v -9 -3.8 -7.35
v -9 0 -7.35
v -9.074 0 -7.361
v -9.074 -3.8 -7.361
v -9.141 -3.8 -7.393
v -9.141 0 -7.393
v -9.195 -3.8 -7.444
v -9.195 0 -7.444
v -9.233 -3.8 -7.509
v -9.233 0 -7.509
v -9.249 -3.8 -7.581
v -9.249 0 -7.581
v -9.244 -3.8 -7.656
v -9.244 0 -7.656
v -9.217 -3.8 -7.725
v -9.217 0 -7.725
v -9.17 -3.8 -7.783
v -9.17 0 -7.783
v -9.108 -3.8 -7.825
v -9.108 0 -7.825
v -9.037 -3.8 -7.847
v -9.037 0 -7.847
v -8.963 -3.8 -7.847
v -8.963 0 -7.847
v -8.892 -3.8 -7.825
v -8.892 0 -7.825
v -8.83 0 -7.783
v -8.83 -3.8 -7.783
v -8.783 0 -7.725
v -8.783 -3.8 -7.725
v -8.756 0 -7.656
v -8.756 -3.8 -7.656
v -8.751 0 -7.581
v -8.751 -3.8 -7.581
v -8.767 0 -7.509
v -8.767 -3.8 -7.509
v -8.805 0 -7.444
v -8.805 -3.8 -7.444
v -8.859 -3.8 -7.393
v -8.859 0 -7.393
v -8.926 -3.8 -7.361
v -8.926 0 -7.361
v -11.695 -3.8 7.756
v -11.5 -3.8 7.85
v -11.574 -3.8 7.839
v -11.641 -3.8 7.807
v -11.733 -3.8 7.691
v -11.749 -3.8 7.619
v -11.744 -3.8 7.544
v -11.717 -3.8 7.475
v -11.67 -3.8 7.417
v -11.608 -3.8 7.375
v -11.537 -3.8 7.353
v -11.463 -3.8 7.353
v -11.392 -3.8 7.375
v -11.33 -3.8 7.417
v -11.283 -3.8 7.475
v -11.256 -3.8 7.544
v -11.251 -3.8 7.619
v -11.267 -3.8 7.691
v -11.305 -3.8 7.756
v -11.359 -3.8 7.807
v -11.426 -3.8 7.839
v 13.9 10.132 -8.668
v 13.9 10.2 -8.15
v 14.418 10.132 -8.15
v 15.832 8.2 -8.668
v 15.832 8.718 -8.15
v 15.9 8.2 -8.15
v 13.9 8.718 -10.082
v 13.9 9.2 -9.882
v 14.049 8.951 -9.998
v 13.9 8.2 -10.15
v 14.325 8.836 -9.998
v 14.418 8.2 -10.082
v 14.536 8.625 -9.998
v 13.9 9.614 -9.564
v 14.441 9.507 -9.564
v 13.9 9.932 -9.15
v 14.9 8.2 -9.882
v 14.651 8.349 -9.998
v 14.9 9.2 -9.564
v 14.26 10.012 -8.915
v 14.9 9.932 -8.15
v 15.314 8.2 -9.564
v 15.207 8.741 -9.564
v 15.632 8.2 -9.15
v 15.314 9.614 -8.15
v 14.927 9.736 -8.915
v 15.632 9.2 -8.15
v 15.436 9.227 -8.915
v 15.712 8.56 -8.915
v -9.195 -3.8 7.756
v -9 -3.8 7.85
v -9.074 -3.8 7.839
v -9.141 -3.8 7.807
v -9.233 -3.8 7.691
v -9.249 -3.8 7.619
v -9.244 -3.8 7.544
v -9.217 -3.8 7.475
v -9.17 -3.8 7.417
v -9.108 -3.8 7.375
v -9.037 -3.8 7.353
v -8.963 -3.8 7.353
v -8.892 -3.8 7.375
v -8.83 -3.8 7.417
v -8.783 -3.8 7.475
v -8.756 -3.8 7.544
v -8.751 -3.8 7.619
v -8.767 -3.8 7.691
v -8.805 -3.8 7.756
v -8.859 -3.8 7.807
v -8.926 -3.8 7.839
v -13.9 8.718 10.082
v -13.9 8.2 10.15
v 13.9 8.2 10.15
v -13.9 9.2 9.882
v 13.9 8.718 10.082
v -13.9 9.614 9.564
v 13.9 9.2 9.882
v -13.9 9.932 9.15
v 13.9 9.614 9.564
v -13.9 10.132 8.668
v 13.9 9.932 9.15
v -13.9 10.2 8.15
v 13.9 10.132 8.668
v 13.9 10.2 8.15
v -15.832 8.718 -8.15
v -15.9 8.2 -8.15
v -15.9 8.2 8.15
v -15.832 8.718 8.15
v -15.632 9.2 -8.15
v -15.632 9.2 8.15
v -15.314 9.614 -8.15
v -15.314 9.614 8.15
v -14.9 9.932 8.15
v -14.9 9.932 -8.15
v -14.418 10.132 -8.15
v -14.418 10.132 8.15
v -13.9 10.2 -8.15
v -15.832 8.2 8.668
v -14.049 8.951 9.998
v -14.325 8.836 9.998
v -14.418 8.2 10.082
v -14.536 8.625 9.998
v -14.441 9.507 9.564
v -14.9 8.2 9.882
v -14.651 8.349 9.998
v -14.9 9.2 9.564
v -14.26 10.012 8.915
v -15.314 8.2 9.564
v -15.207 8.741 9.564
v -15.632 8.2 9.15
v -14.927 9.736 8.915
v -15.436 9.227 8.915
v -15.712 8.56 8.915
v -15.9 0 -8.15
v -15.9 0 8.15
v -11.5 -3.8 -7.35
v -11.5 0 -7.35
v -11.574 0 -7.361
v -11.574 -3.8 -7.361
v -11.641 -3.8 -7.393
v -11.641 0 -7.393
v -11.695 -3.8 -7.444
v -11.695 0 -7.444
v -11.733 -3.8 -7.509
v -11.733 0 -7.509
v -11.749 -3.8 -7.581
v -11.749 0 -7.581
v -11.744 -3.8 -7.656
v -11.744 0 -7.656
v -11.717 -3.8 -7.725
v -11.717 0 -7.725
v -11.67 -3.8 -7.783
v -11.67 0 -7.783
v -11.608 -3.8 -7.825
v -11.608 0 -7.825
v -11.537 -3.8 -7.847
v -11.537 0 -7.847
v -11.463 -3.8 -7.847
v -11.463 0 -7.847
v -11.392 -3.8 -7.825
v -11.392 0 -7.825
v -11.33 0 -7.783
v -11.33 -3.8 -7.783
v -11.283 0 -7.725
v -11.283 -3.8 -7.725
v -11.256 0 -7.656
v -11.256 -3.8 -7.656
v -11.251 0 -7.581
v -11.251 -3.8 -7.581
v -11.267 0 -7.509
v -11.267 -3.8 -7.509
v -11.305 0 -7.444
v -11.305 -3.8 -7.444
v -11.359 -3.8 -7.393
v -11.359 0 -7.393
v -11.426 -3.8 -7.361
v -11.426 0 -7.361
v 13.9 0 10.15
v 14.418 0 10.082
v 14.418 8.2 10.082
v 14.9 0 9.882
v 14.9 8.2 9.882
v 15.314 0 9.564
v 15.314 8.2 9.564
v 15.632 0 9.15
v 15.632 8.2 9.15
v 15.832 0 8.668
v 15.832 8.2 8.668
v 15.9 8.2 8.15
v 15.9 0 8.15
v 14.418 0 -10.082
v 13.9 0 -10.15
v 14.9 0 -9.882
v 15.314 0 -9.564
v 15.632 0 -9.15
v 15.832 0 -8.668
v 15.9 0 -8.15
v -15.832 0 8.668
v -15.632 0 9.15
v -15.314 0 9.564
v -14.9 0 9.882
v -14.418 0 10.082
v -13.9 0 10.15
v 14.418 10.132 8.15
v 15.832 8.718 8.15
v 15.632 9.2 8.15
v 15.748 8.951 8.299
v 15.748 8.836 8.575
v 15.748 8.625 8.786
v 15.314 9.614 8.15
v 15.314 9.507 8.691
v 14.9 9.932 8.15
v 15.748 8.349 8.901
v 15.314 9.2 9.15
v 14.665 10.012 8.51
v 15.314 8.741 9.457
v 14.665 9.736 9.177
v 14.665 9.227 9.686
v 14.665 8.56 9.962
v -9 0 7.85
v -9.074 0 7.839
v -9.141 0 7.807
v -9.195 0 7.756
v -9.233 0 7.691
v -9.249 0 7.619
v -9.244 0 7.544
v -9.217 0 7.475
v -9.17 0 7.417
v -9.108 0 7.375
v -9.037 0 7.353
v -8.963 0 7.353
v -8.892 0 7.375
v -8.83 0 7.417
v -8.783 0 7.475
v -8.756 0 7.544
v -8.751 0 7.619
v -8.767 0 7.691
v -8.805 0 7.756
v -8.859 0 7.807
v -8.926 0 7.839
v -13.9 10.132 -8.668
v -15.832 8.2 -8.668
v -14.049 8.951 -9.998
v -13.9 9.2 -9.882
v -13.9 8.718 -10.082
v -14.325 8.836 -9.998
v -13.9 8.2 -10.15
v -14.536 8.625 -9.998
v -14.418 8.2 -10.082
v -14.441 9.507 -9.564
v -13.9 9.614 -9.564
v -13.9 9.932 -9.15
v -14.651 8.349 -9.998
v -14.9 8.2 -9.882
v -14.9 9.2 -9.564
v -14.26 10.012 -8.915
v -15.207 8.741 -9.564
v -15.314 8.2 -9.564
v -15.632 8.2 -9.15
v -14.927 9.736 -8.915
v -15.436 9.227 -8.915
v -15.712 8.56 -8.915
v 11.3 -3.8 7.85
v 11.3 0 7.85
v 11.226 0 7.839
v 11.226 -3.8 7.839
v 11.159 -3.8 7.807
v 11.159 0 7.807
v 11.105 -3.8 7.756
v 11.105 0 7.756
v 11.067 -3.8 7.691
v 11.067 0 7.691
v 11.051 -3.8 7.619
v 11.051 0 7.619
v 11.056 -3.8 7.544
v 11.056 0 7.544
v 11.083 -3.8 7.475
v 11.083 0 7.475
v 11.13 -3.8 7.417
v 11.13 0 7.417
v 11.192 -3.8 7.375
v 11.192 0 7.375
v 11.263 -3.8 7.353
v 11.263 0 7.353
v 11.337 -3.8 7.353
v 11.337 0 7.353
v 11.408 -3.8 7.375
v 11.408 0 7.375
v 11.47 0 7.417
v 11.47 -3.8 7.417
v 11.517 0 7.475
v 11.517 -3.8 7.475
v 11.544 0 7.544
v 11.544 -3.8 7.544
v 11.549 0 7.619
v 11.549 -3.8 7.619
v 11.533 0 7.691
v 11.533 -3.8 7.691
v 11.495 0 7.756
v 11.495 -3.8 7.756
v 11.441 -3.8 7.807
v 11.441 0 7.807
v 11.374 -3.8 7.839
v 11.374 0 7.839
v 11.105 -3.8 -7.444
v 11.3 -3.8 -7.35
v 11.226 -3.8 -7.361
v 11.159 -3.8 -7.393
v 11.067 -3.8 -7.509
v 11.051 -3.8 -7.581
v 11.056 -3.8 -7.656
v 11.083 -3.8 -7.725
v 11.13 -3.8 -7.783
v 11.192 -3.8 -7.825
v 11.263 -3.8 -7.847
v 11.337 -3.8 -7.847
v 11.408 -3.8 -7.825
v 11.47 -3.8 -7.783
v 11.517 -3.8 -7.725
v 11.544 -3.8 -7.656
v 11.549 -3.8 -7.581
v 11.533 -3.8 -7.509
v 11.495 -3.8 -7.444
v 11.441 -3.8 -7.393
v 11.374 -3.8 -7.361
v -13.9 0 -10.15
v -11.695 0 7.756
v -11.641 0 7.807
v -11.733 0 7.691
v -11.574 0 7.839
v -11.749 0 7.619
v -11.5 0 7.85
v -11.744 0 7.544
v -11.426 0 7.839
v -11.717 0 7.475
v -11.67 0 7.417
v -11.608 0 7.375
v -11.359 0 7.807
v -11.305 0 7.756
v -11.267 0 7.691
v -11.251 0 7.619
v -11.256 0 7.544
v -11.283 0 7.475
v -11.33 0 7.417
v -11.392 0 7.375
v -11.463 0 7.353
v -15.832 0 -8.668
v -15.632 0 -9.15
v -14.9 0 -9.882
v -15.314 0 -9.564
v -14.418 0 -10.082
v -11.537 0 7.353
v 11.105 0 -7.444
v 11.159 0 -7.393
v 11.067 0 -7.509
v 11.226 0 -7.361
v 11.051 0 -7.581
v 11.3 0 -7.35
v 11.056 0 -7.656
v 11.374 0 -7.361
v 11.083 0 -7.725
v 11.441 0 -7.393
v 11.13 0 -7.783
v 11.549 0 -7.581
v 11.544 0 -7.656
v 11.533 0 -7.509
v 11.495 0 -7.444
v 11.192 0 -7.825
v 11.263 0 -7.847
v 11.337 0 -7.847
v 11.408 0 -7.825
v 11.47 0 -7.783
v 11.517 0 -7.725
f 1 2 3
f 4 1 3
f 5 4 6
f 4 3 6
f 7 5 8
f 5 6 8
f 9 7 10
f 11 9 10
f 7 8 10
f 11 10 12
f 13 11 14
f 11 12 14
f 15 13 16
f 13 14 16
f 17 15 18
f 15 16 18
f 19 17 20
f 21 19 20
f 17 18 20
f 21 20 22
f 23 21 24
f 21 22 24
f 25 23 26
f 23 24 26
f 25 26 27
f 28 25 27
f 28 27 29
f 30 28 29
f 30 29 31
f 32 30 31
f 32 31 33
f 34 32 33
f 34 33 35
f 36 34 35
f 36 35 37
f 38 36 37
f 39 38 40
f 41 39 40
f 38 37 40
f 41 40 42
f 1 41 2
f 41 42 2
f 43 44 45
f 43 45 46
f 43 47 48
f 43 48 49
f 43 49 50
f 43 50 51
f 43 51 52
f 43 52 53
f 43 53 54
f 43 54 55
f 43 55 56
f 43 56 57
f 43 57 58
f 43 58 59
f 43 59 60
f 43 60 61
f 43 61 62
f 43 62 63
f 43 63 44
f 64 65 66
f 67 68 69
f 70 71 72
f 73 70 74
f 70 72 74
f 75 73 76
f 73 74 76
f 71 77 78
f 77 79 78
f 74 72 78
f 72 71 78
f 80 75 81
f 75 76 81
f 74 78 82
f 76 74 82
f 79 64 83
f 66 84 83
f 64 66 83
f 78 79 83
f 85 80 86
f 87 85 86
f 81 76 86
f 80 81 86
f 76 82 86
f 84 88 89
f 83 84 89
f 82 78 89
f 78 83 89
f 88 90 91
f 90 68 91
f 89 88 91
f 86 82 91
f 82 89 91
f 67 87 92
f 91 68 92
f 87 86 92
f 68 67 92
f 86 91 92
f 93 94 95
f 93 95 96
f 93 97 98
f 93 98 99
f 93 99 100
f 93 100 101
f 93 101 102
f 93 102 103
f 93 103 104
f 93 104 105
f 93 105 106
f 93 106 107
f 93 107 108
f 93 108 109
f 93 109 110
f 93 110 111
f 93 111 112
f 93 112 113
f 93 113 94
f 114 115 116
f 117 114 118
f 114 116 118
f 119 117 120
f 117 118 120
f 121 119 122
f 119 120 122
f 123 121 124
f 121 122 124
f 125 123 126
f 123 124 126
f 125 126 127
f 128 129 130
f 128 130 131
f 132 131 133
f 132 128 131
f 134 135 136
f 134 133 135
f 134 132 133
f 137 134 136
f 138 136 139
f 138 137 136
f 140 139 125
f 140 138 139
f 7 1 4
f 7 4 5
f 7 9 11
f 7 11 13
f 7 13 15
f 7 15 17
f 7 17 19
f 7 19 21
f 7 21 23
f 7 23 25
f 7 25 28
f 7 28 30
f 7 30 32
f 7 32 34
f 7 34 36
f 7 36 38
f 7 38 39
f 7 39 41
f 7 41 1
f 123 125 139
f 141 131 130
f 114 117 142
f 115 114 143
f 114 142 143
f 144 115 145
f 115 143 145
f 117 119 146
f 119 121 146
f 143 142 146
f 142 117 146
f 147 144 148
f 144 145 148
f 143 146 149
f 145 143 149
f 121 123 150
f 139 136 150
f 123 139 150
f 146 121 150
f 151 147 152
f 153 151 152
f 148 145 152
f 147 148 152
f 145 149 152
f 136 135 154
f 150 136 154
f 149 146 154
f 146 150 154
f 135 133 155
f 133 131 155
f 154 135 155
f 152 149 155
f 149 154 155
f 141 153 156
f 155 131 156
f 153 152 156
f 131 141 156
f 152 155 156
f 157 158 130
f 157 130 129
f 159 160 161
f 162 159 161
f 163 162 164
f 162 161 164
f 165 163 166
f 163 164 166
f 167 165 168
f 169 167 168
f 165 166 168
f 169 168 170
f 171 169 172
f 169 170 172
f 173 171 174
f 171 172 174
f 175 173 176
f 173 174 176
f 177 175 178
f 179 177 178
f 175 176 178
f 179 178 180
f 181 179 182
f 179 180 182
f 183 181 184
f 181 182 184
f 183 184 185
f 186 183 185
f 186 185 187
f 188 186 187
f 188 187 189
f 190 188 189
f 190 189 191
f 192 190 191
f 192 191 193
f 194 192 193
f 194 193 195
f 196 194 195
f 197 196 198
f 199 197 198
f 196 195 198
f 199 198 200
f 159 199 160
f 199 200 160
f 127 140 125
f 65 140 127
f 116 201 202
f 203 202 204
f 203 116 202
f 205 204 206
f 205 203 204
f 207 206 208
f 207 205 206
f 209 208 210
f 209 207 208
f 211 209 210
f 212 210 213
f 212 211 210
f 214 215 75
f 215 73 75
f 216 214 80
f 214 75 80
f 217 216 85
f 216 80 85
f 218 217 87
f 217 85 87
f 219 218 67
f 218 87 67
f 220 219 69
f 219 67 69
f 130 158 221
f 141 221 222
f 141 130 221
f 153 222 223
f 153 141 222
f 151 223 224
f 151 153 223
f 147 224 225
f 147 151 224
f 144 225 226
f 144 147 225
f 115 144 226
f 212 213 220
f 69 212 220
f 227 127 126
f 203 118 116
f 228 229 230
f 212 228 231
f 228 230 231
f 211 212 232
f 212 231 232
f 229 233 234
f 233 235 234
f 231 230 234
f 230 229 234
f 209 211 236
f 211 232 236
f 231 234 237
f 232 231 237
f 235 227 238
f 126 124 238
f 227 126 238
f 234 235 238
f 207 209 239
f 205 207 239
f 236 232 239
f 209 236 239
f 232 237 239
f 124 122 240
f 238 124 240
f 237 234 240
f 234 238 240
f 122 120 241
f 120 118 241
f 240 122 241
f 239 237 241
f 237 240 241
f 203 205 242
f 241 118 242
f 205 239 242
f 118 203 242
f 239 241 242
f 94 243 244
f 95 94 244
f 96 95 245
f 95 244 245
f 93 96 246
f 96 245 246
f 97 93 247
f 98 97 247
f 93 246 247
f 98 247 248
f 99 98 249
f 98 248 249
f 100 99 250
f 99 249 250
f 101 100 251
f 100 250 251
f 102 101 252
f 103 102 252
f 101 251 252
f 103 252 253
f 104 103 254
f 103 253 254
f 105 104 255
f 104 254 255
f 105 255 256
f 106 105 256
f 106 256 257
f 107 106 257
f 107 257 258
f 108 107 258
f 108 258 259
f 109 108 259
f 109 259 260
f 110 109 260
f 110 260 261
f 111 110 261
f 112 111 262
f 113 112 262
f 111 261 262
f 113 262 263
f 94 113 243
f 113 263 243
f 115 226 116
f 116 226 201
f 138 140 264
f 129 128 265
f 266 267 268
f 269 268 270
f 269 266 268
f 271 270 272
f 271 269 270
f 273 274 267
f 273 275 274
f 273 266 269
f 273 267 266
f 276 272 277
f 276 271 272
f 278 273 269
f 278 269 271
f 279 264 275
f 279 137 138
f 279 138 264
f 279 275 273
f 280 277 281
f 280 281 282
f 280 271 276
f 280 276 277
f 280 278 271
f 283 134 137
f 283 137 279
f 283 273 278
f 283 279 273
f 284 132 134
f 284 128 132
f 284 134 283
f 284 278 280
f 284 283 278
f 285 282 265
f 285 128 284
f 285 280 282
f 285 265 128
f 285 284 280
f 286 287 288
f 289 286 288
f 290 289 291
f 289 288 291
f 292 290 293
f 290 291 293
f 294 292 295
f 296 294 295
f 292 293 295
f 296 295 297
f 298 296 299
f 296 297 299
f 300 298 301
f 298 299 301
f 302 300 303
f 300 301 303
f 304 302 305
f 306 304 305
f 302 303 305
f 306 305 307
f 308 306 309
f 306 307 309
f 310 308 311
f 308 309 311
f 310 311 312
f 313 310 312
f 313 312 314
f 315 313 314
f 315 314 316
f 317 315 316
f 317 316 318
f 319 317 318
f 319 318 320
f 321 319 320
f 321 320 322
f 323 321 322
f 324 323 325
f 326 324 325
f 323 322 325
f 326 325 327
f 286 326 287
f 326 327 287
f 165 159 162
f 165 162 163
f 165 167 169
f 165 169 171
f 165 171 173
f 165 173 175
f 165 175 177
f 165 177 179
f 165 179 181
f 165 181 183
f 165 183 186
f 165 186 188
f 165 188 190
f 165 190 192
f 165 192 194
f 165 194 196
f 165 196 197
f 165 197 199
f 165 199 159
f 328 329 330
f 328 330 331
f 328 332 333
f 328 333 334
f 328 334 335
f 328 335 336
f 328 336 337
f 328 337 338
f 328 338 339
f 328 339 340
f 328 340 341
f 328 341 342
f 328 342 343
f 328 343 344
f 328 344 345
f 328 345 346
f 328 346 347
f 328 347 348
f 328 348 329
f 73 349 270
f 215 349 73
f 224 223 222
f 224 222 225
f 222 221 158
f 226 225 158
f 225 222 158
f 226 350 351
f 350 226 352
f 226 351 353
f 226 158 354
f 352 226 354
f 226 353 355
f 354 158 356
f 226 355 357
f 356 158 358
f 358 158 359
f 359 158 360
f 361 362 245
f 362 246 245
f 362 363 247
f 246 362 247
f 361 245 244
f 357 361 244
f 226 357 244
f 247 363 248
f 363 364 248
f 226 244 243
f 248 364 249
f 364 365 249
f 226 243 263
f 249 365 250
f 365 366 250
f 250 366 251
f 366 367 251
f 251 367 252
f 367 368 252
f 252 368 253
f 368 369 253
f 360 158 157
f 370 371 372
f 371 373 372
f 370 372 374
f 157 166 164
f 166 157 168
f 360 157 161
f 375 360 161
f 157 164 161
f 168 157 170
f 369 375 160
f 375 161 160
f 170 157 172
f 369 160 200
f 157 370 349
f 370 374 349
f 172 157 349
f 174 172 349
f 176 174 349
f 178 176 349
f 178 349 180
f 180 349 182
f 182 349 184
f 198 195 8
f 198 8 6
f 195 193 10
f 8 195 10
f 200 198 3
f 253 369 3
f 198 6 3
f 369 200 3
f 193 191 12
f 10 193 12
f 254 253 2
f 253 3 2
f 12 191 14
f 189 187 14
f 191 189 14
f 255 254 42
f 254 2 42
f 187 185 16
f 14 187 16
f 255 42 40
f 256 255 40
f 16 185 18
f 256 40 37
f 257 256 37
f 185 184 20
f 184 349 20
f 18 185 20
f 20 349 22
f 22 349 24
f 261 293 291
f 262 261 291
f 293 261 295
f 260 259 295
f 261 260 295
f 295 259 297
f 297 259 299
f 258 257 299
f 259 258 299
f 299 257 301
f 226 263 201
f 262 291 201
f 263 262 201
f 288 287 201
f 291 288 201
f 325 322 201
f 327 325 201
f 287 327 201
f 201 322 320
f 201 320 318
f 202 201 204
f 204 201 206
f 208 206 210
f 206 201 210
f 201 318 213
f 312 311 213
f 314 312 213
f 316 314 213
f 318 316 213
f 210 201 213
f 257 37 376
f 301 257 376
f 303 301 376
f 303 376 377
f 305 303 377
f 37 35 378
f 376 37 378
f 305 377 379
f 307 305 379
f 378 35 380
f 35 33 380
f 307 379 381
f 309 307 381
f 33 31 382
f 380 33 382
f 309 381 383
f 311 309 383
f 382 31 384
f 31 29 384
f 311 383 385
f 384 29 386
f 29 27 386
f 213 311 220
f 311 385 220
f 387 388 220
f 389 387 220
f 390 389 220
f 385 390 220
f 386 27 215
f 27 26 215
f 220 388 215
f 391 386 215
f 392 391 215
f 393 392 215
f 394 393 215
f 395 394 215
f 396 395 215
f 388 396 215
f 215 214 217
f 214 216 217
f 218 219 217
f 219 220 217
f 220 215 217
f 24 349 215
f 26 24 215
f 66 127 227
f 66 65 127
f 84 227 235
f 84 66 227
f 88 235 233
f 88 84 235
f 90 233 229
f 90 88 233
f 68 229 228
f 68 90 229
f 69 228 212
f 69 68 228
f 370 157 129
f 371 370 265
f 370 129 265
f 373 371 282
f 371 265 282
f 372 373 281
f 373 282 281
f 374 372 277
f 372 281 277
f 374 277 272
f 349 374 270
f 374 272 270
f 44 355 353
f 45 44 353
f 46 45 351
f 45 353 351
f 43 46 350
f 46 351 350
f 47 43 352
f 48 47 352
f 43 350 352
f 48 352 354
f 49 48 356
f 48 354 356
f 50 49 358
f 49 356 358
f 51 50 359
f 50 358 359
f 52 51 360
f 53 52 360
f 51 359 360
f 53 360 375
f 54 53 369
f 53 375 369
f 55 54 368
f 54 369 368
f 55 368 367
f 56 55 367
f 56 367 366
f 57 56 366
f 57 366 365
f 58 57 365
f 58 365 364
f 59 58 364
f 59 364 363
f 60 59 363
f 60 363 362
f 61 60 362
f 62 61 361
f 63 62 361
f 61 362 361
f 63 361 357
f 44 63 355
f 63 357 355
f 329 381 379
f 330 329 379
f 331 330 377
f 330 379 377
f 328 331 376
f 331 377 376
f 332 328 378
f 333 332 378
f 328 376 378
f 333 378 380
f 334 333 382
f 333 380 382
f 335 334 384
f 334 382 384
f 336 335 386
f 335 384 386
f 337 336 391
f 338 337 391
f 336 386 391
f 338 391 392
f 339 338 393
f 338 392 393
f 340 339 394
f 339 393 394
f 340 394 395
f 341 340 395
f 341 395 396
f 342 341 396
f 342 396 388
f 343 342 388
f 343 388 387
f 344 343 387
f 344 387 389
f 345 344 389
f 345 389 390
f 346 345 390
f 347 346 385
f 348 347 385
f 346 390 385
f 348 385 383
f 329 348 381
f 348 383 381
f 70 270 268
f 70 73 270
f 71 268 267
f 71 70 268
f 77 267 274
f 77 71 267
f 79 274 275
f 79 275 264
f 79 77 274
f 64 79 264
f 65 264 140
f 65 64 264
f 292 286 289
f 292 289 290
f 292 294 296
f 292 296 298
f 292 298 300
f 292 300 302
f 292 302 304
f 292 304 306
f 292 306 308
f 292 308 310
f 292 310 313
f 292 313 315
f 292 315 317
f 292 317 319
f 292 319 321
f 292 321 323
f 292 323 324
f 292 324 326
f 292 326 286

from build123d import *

# Parameters (mm, degrees)
SKETCH_1_W      = 31.8
SKETCH_1_H      = 20.3
EXTRUDE_1_DEPTH = 10.2
SKETCH_2_R      = 0.25
EXTRUDE_2_DEPTH = 3.8
FILLET_1_R      = 2


with BuildPart() as part:
    # Эскиз1 → Бобышка-Вытянуть1 (new body)
    with BuildSketch(Plane(origin=(0, 0, 0), x_dir=(1, 0, 0), z_dir=(0, 1, 0))):
        Rectangle(SKETCH_1_W, SKETCH_1_H)
    extrude(amount=EXTRUDE_1_DEPTH)

    # Эскиз2 → Бобышка-Вытянуть2 (add)
    with BuildSketch(Plane.XZ):
        with Locations(Location((11.3, 7.6, 0), (0, 0, 90))):
            Circle(SKETCH_2_R)
        with Locations(Location((-11.5, 7.6, 0), (0, 0, 90))):
            Circle(SKETCH_2_R)
        with Locations(Location((-9, 7.6, 0), (0, 0, 90))):
            Circle(SKETCH_2_R)
        with Locations(Location((-9, -7.6, 0), (0, 0, 90))):
            Circle(SKETCH_2_R)
        with Locations(Location((-11.5, -7.6, 0), (0, 0, 90))):
            Circle(SKETCH_2_R)
        with Locations(Location((11.3, -7.6, 0), (0, 0, 90))):
            Circle(SKETCH_2_R)
    extrude(amount=EXTRUDE_2_DEPTH)

    # Скругление1
    fillet_1_edges = [part.edges().sort_by_distance(p)[0] for p in [
        (-15.9, 10.2, 0),
        (0, 10.2, 10.15),
        (15.9, 10.2, 0),
        (0, 10.2, -10.15),
        (15.9, 5.1, 10.15),
        (-15.9, 5.1, 10.15),
        (-15.9, 5.1, -10.15),
        (15.9, 5.1, -10.15),
    ]]
    fillet(fillet_1_edges, radius=FILLET_1_R)


solid = part.part
